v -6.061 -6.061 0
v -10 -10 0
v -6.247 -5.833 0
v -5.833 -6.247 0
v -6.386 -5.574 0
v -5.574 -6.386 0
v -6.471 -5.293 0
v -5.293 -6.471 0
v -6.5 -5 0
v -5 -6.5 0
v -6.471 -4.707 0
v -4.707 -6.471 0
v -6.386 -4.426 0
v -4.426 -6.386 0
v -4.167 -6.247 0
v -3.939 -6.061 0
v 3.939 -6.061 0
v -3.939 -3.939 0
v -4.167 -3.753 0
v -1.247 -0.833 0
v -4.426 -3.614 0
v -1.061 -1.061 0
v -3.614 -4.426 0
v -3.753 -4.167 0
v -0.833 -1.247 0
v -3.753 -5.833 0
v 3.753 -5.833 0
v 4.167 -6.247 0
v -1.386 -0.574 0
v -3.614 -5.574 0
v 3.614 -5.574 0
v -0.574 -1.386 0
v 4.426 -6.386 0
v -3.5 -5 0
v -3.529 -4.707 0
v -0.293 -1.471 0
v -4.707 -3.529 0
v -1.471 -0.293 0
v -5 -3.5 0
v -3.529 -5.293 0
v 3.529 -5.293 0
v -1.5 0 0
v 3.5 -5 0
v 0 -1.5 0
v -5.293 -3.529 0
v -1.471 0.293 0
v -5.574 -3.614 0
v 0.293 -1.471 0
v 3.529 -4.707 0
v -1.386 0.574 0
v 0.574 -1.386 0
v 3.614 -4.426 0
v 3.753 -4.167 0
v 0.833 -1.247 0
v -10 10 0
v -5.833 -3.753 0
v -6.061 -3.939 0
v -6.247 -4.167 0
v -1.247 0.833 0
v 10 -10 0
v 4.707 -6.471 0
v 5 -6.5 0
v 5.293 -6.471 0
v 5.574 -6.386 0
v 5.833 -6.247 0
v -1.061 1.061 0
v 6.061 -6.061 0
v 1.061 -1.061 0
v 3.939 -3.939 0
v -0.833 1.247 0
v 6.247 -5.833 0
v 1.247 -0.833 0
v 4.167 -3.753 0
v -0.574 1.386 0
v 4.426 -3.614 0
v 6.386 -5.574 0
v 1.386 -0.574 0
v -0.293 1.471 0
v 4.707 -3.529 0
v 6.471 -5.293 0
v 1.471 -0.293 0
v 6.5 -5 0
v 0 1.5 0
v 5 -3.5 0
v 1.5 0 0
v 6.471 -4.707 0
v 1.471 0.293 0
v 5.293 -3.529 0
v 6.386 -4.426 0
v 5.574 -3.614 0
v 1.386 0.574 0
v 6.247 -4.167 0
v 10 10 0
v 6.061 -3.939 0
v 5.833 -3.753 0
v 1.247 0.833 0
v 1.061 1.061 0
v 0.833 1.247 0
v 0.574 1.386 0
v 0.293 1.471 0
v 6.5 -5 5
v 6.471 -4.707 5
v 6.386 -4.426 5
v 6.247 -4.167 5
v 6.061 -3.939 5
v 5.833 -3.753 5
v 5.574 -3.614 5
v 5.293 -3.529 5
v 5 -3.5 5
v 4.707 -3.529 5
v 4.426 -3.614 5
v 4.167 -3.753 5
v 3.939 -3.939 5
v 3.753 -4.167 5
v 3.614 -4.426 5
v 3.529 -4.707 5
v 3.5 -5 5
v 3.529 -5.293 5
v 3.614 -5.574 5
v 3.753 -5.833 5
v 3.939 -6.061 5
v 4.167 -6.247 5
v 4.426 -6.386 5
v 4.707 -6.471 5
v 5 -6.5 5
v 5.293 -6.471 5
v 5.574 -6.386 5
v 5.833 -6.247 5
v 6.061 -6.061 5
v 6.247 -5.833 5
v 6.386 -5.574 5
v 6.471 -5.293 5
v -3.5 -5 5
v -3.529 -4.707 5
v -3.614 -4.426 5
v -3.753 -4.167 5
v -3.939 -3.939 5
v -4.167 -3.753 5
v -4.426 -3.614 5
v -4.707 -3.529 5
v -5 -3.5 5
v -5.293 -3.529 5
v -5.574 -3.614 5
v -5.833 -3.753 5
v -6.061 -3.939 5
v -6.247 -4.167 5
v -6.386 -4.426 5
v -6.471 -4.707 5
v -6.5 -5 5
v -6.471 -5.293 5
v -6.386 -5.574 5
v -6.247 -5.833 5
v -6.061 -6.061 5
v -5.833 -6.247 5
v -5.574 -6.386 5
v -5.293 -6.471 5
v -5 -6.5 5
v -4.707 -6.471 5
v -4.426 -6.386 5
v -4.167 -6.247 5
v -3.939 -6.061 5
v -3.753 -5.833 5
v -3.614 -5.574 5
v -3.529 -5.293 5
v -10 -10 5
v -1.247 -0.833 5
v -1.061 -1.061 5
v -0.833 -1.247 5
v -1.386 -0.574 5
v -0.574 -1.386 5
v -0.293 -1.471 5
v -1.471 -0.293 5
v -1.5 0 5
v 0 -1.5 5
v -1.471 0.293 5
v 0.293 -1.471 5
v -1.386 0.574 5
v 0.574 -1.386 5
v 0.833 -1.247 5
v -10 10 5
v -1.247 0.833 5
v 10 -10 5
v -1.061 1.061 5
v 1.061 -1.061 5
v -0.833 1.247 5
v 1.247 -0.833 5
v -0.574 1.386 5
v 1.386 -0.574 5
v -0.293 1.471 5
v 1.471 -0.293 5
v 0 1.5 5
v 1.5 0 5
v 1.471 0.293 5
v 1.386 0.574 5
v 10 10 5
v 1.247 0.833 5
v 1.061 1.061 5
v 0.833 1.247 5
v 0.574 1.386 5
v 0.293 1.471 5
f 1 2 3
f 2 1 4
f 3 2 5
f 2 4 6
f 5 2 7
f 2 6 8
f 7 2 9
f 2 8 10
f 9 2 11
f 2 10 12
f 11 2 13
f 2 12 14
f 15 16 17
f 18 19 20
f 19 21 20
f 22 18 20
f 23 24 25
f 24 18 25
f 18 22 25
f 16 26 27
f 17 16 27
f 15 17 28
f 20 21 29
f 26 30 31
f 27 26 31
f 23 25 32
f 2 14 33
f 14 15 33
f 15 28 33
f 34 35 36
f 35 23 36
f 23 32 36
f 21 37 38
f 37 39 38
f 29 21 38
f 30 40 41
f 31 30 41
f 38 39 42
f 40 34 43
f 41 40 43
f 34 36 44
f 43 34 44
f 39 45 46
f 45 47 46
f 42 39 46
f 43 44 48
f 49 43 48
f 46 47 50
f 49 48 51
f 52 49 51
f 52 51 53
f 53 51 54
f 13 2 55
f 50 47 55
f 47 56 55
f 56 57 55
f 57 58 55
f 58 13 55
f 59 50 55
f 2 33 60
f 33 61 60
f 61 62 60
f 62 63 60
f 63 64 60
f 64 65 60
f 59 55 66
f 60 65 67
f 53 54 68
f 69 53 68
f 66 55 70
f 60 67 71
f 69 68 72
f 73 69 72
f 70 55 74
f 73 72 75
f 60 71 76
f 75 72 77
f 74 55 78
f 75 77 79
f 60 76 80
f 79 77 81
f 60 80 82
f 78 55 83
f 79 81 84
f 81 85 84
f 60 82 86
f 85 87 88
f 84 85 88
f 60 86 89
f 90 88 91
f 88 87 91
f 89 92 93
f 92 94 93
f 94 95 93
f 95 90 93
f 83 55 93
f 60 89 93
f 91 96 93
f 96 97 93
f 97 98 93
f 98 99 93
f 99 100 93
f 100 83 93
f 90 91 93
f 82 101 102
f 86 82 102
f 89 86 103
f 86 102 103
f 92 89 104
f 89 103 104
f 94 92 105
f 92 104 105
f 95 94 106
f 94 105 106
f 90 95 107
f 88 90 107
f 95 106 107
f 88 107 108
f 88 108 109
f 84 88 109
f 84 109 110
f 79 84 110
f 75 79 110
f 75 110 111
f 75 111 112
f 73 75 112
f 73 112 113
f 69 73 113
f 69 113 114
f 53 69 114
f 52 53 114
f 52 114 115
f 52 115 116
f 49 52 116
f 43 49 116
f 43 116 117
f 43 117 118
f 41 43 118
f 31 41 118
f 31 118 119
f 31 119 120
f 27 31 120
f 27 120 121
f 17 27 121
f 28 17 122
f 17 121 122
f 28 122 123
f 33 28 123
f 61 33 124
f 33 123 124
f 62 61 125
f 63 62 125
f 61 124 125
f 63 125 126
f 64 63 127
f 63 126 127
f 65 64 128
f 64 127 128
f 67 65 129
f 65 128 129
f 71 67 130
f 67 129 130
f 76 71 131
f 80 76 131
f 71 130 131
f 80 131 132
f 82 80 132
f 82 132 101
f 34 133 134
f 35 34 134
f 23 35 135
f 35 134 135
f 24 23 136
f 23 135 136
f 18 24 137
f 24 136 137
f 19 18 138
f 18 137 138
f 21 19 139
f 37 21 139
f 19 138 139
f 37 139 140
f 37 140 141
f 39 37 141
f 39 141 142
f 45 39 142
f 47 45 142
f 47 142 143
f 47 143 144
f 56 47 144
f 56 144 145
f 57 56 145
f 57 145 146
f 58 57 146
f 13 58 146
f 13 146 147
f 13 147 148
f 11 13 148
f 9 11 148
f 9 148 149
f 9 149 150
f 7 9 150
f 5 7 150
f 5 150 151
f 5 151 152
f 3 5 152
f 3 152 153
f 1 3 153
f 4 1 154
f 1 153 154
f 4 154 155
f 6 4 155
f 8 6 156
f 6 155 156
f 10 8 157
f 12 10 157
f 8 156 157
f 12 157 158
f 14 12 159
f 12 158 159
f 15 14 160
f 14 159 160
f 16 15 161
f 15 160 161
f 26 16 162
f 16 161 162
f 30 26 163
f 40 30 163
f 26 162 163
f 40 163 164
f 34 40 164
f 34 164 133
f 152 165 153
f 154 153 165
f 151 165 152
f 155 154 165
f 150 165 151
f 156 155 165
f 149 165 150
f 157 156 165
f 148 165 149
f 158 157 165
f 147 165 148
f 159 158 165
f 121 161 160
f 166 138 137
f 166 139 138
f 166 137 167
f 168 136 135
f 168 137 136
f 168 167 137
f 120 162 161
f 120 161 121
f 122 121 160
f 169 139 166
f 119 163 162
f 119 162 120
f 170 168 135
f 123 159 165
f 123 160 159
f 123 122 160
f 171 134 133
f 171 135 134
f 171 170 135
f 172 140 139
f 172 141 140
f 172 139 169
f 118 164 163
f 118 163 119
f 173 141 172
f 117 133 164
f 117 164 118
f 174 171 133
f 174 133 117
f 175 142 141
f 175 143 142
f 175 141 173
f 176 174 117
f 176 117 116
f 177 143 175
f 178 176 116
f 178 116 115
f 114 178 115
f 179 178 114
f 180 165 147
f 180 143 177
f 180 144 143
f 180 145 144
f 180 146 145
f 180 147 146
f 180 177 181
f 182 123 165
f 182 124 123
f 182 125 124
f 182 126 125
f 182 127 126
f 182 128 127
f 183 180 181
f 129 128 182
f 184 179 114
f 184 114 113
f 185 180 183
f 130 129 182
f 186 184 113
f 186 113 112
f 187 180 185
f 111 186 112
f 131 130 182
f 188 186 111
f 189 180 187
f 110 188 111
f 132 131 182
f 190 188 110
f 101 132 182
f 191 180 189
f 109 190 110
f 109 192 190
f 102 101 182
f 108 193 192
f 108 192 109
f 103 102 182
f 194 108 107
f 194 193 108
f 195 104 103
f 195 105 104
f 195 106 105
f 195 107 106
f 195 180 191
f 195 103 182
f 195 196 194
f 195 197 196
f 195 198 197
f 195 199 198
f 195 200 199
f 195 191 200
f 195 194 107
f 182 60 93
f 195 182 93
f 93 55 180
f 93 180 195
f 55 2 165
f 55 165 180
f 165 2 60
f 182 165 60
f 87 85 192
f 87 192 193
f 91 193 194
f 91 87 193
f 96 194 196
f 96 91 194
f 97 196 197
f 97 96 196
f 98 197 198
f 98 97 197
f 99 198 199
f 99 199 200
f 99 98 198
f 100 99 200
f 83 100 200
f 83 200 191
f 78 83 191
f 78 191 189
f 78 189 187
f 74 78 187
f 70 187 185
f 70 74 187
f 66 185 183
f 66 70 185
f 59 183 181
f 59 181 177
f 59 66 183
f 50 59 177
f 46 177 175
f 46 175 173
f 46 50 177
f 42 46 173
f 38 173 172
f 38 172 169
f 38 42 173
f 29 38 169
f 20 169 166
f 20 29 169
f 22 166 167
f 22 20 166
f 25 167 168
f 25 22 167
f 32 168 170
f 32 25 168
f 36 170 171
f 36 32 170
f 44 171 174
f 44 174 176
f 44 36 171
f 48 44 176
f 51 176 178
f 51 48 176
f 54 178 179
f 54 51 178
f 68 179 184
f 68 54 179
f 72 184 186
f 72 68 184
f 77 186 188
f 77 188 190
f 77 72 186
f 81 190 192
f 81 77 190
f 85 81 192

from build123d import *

# Parameters (mm, degrees)
SKETCH_1_W          = 20
SKETCH_1_H          = 20
SKETCH_1_R          = 1.5
EXTRUDE_1_DEPTH     = 5
SKETCH_2_R          = 1.5
CUT_EXTRUDE_1_DEPTH = 10


with BuildPart() as part:
    # 草图1 → 凸台-拉伸1 (new body)
    with BuildSketch(Plane.XY):
        Rectangle(SKETCH_1_W, SKETCH_1_H)
        Circle(SKETCH_1_R, mode=Mode.SUBTRACT)
    extrude(amount=EXTRUDE_1_DEPTH)

    # 草图2 → 切除-拉伸1 (cut)
    with BuildSketch(Plane.XY.offset(5)):
        with Locations((-5, -5)):
            Circle(SKETCH_2_R)
        with Locations((5, -5)):
            Circle(SKETCH_2_R)
    extrude(amount=-CUT_EXTRUDE_1_DEPTH, mode=Mode.SUBTRACT)


solid = part.part
